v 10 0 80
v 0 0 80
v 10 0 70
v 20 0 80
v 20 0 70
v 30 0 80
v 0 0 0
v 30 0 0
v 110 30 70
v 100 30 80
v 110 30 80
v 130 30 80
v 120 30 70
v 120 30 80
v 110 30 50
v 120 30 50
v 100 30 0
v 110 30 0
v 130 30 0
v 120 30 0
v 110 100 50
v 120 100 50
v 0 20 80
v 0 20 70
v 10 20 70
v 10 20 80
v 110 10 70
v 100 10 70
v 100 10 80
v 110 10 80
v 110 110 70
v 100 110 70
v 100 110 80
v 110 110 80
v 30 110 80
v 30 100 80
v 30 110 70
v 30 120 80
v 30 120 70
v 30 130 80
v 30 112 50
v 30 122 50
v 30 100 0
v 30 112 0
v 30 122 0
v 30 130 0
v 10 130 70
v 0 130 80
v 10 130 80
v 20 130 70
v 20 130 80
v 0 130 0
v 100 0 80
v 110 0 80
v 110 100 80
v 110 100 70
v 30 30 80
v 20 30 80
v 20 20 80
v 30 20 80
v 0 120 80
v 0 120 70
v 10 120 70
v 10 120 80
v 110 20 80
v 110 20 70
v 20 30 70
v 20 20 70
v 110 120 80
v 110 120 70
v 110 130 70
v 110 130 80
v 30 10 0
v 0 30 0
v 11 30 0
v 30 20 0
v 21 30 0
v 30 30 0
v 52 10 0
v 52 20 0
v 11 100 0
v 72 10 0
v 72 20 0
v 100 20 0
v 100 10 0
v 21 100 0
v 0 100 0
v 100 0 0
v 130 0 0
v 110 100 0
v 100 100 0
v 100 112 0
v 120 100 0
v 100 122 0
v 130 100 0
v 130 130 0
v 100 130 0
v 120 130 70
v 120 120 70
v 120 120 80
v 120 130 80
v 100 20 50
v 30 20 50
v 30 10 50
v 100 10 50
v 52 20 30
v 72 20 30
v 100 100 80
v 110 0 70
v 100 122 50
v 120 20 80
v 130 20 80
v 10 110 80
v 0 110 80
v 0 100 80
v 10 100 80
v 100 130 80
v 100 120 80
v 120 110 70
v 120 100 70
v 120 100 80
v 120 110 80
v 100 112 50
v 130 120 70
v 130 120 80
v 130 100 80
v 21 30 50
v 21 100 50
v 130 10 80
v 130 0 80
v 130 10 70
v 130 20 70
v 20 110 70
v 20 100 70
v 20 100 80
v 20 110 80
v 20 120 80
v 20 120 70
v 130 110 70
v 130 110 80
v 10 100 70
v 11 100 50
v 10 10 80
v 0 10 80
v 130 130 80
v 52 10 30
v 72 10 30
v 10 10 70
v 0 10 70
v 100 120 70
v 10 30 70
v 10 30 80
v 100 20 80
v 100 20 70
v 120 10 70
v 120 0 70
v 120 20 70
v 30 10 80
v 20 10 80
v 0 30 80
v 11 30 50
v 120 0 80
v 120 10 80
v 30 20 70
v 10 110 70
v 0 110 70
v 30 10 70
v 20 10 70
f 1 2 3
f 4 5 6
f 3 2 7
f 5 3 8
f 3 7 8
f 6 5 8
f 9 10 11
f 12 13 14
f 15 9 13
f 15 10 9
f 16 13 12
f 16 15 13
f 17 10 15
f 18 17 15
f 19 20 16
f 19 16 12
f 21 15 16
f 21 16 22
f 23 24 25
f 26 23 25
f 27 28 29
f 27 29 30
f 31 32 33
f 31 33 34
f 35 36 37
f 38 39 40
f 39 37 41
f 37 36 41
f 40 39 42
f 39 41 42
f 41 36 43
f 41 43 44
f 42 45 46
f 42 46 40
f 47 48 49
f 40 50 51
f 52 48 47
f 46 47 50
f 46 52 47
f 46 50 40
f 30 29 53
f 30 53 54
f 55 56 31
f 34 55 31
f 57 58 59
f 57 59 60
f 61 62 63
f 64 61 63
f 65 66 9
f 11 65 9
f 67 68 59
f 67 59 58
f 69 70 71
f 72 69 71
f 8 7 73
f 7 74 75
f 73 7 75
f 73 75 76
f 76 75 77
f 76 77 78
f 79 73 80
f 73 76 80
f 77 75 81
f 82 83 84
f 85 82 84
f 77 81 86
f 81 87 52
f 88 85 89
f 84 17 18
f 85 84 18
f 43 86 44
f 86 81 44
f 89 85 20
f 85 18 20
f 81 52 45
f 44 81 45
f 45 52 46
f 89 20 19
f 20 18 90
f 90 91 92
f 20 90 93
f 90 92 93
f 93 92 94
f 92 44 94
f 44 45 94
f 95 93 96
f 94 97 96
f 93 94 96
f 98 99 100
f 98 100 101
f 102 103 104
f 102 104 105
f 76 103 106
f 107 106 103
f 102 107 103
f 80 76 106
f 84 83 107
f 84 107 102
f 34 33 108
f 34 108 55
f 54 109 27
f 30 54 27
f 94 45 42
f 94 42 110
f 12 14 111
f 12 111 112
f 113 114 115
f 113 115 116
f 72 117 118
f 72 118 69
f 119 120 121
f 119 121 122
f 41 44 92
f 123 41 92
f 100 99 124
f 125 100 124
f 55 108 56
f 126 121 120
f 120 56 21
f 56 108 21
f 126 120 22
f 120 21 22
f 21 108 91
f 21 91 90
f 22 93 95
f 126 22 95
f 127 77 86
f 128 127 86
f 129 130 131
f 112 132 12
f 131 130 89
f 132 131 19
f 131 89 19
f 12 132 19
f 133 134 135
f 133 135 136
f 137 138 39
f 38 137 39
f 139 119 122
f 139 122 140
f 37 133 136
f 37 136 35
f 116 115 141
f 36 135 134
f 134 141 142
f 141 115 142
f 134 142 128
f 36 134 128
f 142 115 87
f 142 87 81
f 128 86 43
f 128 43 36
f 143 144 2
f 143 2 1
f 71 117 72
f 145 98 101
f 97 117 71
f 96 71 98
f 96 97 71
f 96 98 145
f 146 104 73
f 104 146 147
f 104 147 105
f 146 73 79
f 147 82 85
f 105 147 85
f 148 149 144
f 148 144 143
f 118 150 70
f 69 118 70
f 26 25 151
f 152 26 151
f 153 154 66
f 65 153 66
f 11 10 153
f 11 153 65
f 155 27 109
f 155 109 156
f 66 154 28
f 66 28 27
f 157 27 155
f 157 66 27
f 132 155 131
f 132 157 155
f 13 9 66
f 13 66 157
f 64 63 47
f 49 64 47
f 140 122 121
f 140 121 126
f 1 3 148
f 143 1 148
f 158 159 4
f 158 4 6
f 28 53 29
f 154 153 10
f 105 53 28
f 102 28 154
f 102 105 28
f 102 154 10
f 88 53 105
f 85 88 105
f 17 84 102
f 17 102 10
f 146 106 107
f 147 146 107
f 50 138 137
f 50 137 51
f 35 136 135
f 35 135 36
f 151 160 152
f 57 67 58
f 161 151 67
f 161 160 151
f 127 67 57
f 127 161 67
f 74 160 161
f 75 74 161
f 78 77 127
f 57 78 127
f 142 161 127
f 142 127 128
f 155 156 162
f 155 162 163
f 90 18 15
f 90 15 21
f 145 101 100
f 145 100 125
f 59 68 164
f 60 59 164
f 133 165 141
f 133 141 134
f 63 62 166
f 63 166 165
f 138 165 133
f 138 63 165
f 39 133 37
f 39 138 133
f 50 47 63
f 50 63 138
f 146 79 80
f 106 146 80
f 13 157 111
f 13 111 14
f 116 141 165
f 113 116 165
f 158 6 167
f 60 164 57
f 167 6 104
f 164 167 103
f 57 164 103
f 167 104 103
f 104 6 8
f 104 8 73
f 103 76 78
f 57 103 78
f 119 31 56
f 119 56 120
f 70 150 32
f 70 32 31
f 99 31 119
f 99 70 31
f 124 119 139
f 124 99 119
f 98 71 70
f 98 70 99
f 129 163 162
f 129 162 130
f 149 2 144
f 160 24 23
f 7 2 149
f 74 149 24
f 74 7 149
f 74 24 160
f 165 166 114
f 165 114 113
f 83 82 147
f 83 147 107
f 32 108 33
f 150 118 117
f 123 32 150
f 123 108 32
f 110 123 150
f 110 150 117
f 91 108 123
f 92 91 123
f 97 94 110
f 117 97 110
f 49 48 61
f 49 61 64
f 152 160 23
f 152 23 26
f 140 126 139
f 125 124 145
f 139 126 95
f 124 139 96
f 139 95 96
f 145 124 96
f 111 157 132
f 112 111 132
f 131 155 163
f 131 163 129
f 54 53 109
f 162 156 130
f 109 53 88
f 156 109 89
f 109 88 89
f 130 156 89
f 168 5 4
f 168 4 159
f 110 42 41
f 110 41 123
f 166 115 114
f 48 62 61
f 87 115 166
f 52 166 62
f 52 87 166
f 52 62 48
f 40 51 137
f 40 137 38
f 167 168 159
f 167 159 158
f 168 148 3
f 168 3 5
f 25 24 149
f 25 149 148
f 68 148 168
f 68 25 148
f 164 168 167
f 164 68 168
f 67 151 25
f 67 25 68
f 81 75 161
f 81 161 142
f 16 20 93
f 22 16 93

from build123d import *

# Parameters (mm, degrees)
BOX009_W               = 20
BOX009_H               = 30
BOX009_DEPTH           = 30
BOX008_W               = 70
BOX008_H               = 10
BOX008_DEPTH           = 50
BOX008_PLACEMENT_ANGLE = 90
BOX005_W               = 70
BOX005_H               = 10
BOX005_DEPTH           = 50
BOX001_W               = 10
BOX001_H               = 10
BOX001_DEPTH           = 10
BOX004_W               = 10
BOX004_H               = 10
BOX004_DEPTH           = 10
BOX003_W               = 10
BOX003_H               = 10
BOX003_DEPTH           = 10
BOX002_W               = 10
BOX002_H               = 10
BOX002_DEPTH           = 10
BOX_W                  = 30
BOX_H                  = 30
BOX_DEPTH              = 70
BOX007_W               = 70
BOX007_H               = 10
BOX007_DEPTH           = 50
BOX007_PLACEMENT_ANGLE = 90
BOX006_W               = 70
BOX006_H               = 10
BOX006_DEPTH           = 50


with BuildPart() as main_door:
    # Box009 → Box009 (new body)
    with BuildSketch(Plane(origin=(52, 0, 0), x_dir=(1, 0, 0), z_dir=(0, 0, 1))):
        with Locations((10, 15)):
            Rectangle(BOX009_W, BOX009_H)
    extrude(amount=BOX009_DEPTH)


with BuildPart() as right_wall:
    # Box008 → Box008 (new body)
    with BuildSketch(Plane.XY):
        with Locations((35, 5)):
            Rectangle(BOX008_W, BOX008_H)
    extrude(amount=BOX008_DEPTH)


with BuildPart() as right_wall_1:
    # Box008 placement: moved
    add(right_wall.part.moved(Location((120, 30, 0))).rotate(Axis((120, 30, 0), (0, 0, 1)), BOX008_PLACEMENT_ANGLE))


with BuildPart() as front_wall:
    # Box005 → Box005 (new body)
    with BuildSketch(Plane(origin=(30, 10, 0), x_dir=(1, 0, 0), z_dir=(0, 0, 1))):
        with Locations((35, 5)):
            Rectangle(BOX005_W, BOX005_H)
    extrude(amount=BOX005_DEPTH)


with BuildPart() as cube001:
    # Box001 → Box001 (new body)
    with BuildSketch(Plane.XY.offset(70)):
        with Locations((5, 5)):
            Rectangle(BOX001_W, BOX001_H)
    extrude(amount=BOX001_DEPTH)


with BuildPart() as cube004:
    # Box004 → Box004 (new body)
    with BuildSketch(Plane(origin=(20, 20, 70), x_dir=(1, 0, 0), z_dir=(0, 0, 1))):
        with Locations((5, 5)):
            Rectangle(BOX004_W, BOX004_H)
    extrude(amount=BOX004_DEPTH)


with BuildPart() as cube003:
    # Box003 → Box003 (new body)
    with BuildSketch(Plane(origin=(0, 20, 70), x_dir=(1, 0, 0), z_dir=(0, 0, 1))):
        with Locations((5, 5)):
            Rectangle(BOX003_W, BOX003_H)
    extrude(amount=BOX003_DEPTH)


with BuildPart() as cube002:
    # Box002 → Box002 (new body)
    with BuildSketch(Plane(origin=(20, 0, 70), x_dir=(1, 0, 0), z_dir=(0, 0, 1))):
        with Locations((5, 5)):
            Rectangle(BOX002_W, BOX002_H)
    extrude(amount=BOX002_DEPTH)


with BuildPart() as cube:
    # Box → Box (new body)
    with BuildSketch(Plane.XY):
        with Locations((15, 15)):
            Rectangle(BOX_W, BOX_H)
    extrude(amount=BOX_DEPTH)


with BuildPart() as fusion002:
    # Fusion002 base: copy of Cube
    add(cube.part)

    # Fusion002: union Cube001, Cube004, Cube003, Cube002
    add(cube001.part)
    add(cube004.part)
    add(cube003.part)
    add(cube002.part)


with BuildPart() as fusion002_1:
    # Fusion002 placement: moved
    add(fusion002.part.moved(Location((0, 100, 0))))


with BuildPart() as left_wall:
    # Box007 → Box007 (new body)
    with BuildSketch(Plane.XY):
        with Locations((35, 5)):
            Rectangle(BOX007_W, BOX007_H)
    extrude(amount=BOX007_DEPTH)


with BuildPart() as left_wall_1:
    # Box007 placement: moved
    add(left_wall.part.moved(Location((21, 30, 0))).rotate(Axis((21, 30, 0), (0, 0, 1)), BOX007_PLACEMENT_ANGLE))


with BuildPart() as fusion001:
    # Fusion001 base: copy of Cube
    add(cube.part)

    # Fusion001: union Cube001, Cube004, Cube003, Cube002
    add(cube001.part)
    add(cube004.part)
    add(cube003.part)
    add(cube002.part)


with BuildPart() as fusion001_1:
    # Fusion001 placement: moved
    add(fusion001.part.moved(Location((100, 0, 0))))


with BuildPart() as back_wall:
    # Box006 → Box006 (new body)
    with BuildSketch(Plane(origin=(30, 112, 0), x_dir=(1, 0, 0), z_dir=(0, 0, 1))):
        with Locations((35, 5)):
            Rectangle(BOX006_W, BOX006_H)
    extrude(amount=BOX006_DEPTH)


with BuildPart() as fusion003:
    # Fusion003 base: copy of Cube
    add(cube.part)

    # Fusion003: union Cube001, Cube004, Cube003, Cube002
    add(cube001.part)
    add(cube004.part)
    add(cube003.part)
    add(cube002.part)


with BuildPart() as fusion003_1:
    # Fusion003 placement: moved
    add(fusion003.part.moved(Location((100, 100, 0))))


with BuildPart() as castle:
    # Fusion base: copy of Cube
    add(cube.part)

    # Fusion: union Cube001, Cube004, Cube003, Cube002
    add(cube001.part)
    add(cube004.part)
    add(cube003.part)
    add(cube002.part)

    # Fusion004: union right-wall, front-wall, Fusion002, left-wall, Fusion001, back-wall, Fusion003
    add(right_wall_1.part)
    add(front_wall.part)
    add(fusion002_1.part)
    add(left_wall_1.part)
    add(fusion001_1.part)
    add(back_wall.part)
    add(fusion003_1.part)

    # Cut: cut main_door
    add(main_door.part, mode=Mode.SUBTRACT)


solid = castle.part
